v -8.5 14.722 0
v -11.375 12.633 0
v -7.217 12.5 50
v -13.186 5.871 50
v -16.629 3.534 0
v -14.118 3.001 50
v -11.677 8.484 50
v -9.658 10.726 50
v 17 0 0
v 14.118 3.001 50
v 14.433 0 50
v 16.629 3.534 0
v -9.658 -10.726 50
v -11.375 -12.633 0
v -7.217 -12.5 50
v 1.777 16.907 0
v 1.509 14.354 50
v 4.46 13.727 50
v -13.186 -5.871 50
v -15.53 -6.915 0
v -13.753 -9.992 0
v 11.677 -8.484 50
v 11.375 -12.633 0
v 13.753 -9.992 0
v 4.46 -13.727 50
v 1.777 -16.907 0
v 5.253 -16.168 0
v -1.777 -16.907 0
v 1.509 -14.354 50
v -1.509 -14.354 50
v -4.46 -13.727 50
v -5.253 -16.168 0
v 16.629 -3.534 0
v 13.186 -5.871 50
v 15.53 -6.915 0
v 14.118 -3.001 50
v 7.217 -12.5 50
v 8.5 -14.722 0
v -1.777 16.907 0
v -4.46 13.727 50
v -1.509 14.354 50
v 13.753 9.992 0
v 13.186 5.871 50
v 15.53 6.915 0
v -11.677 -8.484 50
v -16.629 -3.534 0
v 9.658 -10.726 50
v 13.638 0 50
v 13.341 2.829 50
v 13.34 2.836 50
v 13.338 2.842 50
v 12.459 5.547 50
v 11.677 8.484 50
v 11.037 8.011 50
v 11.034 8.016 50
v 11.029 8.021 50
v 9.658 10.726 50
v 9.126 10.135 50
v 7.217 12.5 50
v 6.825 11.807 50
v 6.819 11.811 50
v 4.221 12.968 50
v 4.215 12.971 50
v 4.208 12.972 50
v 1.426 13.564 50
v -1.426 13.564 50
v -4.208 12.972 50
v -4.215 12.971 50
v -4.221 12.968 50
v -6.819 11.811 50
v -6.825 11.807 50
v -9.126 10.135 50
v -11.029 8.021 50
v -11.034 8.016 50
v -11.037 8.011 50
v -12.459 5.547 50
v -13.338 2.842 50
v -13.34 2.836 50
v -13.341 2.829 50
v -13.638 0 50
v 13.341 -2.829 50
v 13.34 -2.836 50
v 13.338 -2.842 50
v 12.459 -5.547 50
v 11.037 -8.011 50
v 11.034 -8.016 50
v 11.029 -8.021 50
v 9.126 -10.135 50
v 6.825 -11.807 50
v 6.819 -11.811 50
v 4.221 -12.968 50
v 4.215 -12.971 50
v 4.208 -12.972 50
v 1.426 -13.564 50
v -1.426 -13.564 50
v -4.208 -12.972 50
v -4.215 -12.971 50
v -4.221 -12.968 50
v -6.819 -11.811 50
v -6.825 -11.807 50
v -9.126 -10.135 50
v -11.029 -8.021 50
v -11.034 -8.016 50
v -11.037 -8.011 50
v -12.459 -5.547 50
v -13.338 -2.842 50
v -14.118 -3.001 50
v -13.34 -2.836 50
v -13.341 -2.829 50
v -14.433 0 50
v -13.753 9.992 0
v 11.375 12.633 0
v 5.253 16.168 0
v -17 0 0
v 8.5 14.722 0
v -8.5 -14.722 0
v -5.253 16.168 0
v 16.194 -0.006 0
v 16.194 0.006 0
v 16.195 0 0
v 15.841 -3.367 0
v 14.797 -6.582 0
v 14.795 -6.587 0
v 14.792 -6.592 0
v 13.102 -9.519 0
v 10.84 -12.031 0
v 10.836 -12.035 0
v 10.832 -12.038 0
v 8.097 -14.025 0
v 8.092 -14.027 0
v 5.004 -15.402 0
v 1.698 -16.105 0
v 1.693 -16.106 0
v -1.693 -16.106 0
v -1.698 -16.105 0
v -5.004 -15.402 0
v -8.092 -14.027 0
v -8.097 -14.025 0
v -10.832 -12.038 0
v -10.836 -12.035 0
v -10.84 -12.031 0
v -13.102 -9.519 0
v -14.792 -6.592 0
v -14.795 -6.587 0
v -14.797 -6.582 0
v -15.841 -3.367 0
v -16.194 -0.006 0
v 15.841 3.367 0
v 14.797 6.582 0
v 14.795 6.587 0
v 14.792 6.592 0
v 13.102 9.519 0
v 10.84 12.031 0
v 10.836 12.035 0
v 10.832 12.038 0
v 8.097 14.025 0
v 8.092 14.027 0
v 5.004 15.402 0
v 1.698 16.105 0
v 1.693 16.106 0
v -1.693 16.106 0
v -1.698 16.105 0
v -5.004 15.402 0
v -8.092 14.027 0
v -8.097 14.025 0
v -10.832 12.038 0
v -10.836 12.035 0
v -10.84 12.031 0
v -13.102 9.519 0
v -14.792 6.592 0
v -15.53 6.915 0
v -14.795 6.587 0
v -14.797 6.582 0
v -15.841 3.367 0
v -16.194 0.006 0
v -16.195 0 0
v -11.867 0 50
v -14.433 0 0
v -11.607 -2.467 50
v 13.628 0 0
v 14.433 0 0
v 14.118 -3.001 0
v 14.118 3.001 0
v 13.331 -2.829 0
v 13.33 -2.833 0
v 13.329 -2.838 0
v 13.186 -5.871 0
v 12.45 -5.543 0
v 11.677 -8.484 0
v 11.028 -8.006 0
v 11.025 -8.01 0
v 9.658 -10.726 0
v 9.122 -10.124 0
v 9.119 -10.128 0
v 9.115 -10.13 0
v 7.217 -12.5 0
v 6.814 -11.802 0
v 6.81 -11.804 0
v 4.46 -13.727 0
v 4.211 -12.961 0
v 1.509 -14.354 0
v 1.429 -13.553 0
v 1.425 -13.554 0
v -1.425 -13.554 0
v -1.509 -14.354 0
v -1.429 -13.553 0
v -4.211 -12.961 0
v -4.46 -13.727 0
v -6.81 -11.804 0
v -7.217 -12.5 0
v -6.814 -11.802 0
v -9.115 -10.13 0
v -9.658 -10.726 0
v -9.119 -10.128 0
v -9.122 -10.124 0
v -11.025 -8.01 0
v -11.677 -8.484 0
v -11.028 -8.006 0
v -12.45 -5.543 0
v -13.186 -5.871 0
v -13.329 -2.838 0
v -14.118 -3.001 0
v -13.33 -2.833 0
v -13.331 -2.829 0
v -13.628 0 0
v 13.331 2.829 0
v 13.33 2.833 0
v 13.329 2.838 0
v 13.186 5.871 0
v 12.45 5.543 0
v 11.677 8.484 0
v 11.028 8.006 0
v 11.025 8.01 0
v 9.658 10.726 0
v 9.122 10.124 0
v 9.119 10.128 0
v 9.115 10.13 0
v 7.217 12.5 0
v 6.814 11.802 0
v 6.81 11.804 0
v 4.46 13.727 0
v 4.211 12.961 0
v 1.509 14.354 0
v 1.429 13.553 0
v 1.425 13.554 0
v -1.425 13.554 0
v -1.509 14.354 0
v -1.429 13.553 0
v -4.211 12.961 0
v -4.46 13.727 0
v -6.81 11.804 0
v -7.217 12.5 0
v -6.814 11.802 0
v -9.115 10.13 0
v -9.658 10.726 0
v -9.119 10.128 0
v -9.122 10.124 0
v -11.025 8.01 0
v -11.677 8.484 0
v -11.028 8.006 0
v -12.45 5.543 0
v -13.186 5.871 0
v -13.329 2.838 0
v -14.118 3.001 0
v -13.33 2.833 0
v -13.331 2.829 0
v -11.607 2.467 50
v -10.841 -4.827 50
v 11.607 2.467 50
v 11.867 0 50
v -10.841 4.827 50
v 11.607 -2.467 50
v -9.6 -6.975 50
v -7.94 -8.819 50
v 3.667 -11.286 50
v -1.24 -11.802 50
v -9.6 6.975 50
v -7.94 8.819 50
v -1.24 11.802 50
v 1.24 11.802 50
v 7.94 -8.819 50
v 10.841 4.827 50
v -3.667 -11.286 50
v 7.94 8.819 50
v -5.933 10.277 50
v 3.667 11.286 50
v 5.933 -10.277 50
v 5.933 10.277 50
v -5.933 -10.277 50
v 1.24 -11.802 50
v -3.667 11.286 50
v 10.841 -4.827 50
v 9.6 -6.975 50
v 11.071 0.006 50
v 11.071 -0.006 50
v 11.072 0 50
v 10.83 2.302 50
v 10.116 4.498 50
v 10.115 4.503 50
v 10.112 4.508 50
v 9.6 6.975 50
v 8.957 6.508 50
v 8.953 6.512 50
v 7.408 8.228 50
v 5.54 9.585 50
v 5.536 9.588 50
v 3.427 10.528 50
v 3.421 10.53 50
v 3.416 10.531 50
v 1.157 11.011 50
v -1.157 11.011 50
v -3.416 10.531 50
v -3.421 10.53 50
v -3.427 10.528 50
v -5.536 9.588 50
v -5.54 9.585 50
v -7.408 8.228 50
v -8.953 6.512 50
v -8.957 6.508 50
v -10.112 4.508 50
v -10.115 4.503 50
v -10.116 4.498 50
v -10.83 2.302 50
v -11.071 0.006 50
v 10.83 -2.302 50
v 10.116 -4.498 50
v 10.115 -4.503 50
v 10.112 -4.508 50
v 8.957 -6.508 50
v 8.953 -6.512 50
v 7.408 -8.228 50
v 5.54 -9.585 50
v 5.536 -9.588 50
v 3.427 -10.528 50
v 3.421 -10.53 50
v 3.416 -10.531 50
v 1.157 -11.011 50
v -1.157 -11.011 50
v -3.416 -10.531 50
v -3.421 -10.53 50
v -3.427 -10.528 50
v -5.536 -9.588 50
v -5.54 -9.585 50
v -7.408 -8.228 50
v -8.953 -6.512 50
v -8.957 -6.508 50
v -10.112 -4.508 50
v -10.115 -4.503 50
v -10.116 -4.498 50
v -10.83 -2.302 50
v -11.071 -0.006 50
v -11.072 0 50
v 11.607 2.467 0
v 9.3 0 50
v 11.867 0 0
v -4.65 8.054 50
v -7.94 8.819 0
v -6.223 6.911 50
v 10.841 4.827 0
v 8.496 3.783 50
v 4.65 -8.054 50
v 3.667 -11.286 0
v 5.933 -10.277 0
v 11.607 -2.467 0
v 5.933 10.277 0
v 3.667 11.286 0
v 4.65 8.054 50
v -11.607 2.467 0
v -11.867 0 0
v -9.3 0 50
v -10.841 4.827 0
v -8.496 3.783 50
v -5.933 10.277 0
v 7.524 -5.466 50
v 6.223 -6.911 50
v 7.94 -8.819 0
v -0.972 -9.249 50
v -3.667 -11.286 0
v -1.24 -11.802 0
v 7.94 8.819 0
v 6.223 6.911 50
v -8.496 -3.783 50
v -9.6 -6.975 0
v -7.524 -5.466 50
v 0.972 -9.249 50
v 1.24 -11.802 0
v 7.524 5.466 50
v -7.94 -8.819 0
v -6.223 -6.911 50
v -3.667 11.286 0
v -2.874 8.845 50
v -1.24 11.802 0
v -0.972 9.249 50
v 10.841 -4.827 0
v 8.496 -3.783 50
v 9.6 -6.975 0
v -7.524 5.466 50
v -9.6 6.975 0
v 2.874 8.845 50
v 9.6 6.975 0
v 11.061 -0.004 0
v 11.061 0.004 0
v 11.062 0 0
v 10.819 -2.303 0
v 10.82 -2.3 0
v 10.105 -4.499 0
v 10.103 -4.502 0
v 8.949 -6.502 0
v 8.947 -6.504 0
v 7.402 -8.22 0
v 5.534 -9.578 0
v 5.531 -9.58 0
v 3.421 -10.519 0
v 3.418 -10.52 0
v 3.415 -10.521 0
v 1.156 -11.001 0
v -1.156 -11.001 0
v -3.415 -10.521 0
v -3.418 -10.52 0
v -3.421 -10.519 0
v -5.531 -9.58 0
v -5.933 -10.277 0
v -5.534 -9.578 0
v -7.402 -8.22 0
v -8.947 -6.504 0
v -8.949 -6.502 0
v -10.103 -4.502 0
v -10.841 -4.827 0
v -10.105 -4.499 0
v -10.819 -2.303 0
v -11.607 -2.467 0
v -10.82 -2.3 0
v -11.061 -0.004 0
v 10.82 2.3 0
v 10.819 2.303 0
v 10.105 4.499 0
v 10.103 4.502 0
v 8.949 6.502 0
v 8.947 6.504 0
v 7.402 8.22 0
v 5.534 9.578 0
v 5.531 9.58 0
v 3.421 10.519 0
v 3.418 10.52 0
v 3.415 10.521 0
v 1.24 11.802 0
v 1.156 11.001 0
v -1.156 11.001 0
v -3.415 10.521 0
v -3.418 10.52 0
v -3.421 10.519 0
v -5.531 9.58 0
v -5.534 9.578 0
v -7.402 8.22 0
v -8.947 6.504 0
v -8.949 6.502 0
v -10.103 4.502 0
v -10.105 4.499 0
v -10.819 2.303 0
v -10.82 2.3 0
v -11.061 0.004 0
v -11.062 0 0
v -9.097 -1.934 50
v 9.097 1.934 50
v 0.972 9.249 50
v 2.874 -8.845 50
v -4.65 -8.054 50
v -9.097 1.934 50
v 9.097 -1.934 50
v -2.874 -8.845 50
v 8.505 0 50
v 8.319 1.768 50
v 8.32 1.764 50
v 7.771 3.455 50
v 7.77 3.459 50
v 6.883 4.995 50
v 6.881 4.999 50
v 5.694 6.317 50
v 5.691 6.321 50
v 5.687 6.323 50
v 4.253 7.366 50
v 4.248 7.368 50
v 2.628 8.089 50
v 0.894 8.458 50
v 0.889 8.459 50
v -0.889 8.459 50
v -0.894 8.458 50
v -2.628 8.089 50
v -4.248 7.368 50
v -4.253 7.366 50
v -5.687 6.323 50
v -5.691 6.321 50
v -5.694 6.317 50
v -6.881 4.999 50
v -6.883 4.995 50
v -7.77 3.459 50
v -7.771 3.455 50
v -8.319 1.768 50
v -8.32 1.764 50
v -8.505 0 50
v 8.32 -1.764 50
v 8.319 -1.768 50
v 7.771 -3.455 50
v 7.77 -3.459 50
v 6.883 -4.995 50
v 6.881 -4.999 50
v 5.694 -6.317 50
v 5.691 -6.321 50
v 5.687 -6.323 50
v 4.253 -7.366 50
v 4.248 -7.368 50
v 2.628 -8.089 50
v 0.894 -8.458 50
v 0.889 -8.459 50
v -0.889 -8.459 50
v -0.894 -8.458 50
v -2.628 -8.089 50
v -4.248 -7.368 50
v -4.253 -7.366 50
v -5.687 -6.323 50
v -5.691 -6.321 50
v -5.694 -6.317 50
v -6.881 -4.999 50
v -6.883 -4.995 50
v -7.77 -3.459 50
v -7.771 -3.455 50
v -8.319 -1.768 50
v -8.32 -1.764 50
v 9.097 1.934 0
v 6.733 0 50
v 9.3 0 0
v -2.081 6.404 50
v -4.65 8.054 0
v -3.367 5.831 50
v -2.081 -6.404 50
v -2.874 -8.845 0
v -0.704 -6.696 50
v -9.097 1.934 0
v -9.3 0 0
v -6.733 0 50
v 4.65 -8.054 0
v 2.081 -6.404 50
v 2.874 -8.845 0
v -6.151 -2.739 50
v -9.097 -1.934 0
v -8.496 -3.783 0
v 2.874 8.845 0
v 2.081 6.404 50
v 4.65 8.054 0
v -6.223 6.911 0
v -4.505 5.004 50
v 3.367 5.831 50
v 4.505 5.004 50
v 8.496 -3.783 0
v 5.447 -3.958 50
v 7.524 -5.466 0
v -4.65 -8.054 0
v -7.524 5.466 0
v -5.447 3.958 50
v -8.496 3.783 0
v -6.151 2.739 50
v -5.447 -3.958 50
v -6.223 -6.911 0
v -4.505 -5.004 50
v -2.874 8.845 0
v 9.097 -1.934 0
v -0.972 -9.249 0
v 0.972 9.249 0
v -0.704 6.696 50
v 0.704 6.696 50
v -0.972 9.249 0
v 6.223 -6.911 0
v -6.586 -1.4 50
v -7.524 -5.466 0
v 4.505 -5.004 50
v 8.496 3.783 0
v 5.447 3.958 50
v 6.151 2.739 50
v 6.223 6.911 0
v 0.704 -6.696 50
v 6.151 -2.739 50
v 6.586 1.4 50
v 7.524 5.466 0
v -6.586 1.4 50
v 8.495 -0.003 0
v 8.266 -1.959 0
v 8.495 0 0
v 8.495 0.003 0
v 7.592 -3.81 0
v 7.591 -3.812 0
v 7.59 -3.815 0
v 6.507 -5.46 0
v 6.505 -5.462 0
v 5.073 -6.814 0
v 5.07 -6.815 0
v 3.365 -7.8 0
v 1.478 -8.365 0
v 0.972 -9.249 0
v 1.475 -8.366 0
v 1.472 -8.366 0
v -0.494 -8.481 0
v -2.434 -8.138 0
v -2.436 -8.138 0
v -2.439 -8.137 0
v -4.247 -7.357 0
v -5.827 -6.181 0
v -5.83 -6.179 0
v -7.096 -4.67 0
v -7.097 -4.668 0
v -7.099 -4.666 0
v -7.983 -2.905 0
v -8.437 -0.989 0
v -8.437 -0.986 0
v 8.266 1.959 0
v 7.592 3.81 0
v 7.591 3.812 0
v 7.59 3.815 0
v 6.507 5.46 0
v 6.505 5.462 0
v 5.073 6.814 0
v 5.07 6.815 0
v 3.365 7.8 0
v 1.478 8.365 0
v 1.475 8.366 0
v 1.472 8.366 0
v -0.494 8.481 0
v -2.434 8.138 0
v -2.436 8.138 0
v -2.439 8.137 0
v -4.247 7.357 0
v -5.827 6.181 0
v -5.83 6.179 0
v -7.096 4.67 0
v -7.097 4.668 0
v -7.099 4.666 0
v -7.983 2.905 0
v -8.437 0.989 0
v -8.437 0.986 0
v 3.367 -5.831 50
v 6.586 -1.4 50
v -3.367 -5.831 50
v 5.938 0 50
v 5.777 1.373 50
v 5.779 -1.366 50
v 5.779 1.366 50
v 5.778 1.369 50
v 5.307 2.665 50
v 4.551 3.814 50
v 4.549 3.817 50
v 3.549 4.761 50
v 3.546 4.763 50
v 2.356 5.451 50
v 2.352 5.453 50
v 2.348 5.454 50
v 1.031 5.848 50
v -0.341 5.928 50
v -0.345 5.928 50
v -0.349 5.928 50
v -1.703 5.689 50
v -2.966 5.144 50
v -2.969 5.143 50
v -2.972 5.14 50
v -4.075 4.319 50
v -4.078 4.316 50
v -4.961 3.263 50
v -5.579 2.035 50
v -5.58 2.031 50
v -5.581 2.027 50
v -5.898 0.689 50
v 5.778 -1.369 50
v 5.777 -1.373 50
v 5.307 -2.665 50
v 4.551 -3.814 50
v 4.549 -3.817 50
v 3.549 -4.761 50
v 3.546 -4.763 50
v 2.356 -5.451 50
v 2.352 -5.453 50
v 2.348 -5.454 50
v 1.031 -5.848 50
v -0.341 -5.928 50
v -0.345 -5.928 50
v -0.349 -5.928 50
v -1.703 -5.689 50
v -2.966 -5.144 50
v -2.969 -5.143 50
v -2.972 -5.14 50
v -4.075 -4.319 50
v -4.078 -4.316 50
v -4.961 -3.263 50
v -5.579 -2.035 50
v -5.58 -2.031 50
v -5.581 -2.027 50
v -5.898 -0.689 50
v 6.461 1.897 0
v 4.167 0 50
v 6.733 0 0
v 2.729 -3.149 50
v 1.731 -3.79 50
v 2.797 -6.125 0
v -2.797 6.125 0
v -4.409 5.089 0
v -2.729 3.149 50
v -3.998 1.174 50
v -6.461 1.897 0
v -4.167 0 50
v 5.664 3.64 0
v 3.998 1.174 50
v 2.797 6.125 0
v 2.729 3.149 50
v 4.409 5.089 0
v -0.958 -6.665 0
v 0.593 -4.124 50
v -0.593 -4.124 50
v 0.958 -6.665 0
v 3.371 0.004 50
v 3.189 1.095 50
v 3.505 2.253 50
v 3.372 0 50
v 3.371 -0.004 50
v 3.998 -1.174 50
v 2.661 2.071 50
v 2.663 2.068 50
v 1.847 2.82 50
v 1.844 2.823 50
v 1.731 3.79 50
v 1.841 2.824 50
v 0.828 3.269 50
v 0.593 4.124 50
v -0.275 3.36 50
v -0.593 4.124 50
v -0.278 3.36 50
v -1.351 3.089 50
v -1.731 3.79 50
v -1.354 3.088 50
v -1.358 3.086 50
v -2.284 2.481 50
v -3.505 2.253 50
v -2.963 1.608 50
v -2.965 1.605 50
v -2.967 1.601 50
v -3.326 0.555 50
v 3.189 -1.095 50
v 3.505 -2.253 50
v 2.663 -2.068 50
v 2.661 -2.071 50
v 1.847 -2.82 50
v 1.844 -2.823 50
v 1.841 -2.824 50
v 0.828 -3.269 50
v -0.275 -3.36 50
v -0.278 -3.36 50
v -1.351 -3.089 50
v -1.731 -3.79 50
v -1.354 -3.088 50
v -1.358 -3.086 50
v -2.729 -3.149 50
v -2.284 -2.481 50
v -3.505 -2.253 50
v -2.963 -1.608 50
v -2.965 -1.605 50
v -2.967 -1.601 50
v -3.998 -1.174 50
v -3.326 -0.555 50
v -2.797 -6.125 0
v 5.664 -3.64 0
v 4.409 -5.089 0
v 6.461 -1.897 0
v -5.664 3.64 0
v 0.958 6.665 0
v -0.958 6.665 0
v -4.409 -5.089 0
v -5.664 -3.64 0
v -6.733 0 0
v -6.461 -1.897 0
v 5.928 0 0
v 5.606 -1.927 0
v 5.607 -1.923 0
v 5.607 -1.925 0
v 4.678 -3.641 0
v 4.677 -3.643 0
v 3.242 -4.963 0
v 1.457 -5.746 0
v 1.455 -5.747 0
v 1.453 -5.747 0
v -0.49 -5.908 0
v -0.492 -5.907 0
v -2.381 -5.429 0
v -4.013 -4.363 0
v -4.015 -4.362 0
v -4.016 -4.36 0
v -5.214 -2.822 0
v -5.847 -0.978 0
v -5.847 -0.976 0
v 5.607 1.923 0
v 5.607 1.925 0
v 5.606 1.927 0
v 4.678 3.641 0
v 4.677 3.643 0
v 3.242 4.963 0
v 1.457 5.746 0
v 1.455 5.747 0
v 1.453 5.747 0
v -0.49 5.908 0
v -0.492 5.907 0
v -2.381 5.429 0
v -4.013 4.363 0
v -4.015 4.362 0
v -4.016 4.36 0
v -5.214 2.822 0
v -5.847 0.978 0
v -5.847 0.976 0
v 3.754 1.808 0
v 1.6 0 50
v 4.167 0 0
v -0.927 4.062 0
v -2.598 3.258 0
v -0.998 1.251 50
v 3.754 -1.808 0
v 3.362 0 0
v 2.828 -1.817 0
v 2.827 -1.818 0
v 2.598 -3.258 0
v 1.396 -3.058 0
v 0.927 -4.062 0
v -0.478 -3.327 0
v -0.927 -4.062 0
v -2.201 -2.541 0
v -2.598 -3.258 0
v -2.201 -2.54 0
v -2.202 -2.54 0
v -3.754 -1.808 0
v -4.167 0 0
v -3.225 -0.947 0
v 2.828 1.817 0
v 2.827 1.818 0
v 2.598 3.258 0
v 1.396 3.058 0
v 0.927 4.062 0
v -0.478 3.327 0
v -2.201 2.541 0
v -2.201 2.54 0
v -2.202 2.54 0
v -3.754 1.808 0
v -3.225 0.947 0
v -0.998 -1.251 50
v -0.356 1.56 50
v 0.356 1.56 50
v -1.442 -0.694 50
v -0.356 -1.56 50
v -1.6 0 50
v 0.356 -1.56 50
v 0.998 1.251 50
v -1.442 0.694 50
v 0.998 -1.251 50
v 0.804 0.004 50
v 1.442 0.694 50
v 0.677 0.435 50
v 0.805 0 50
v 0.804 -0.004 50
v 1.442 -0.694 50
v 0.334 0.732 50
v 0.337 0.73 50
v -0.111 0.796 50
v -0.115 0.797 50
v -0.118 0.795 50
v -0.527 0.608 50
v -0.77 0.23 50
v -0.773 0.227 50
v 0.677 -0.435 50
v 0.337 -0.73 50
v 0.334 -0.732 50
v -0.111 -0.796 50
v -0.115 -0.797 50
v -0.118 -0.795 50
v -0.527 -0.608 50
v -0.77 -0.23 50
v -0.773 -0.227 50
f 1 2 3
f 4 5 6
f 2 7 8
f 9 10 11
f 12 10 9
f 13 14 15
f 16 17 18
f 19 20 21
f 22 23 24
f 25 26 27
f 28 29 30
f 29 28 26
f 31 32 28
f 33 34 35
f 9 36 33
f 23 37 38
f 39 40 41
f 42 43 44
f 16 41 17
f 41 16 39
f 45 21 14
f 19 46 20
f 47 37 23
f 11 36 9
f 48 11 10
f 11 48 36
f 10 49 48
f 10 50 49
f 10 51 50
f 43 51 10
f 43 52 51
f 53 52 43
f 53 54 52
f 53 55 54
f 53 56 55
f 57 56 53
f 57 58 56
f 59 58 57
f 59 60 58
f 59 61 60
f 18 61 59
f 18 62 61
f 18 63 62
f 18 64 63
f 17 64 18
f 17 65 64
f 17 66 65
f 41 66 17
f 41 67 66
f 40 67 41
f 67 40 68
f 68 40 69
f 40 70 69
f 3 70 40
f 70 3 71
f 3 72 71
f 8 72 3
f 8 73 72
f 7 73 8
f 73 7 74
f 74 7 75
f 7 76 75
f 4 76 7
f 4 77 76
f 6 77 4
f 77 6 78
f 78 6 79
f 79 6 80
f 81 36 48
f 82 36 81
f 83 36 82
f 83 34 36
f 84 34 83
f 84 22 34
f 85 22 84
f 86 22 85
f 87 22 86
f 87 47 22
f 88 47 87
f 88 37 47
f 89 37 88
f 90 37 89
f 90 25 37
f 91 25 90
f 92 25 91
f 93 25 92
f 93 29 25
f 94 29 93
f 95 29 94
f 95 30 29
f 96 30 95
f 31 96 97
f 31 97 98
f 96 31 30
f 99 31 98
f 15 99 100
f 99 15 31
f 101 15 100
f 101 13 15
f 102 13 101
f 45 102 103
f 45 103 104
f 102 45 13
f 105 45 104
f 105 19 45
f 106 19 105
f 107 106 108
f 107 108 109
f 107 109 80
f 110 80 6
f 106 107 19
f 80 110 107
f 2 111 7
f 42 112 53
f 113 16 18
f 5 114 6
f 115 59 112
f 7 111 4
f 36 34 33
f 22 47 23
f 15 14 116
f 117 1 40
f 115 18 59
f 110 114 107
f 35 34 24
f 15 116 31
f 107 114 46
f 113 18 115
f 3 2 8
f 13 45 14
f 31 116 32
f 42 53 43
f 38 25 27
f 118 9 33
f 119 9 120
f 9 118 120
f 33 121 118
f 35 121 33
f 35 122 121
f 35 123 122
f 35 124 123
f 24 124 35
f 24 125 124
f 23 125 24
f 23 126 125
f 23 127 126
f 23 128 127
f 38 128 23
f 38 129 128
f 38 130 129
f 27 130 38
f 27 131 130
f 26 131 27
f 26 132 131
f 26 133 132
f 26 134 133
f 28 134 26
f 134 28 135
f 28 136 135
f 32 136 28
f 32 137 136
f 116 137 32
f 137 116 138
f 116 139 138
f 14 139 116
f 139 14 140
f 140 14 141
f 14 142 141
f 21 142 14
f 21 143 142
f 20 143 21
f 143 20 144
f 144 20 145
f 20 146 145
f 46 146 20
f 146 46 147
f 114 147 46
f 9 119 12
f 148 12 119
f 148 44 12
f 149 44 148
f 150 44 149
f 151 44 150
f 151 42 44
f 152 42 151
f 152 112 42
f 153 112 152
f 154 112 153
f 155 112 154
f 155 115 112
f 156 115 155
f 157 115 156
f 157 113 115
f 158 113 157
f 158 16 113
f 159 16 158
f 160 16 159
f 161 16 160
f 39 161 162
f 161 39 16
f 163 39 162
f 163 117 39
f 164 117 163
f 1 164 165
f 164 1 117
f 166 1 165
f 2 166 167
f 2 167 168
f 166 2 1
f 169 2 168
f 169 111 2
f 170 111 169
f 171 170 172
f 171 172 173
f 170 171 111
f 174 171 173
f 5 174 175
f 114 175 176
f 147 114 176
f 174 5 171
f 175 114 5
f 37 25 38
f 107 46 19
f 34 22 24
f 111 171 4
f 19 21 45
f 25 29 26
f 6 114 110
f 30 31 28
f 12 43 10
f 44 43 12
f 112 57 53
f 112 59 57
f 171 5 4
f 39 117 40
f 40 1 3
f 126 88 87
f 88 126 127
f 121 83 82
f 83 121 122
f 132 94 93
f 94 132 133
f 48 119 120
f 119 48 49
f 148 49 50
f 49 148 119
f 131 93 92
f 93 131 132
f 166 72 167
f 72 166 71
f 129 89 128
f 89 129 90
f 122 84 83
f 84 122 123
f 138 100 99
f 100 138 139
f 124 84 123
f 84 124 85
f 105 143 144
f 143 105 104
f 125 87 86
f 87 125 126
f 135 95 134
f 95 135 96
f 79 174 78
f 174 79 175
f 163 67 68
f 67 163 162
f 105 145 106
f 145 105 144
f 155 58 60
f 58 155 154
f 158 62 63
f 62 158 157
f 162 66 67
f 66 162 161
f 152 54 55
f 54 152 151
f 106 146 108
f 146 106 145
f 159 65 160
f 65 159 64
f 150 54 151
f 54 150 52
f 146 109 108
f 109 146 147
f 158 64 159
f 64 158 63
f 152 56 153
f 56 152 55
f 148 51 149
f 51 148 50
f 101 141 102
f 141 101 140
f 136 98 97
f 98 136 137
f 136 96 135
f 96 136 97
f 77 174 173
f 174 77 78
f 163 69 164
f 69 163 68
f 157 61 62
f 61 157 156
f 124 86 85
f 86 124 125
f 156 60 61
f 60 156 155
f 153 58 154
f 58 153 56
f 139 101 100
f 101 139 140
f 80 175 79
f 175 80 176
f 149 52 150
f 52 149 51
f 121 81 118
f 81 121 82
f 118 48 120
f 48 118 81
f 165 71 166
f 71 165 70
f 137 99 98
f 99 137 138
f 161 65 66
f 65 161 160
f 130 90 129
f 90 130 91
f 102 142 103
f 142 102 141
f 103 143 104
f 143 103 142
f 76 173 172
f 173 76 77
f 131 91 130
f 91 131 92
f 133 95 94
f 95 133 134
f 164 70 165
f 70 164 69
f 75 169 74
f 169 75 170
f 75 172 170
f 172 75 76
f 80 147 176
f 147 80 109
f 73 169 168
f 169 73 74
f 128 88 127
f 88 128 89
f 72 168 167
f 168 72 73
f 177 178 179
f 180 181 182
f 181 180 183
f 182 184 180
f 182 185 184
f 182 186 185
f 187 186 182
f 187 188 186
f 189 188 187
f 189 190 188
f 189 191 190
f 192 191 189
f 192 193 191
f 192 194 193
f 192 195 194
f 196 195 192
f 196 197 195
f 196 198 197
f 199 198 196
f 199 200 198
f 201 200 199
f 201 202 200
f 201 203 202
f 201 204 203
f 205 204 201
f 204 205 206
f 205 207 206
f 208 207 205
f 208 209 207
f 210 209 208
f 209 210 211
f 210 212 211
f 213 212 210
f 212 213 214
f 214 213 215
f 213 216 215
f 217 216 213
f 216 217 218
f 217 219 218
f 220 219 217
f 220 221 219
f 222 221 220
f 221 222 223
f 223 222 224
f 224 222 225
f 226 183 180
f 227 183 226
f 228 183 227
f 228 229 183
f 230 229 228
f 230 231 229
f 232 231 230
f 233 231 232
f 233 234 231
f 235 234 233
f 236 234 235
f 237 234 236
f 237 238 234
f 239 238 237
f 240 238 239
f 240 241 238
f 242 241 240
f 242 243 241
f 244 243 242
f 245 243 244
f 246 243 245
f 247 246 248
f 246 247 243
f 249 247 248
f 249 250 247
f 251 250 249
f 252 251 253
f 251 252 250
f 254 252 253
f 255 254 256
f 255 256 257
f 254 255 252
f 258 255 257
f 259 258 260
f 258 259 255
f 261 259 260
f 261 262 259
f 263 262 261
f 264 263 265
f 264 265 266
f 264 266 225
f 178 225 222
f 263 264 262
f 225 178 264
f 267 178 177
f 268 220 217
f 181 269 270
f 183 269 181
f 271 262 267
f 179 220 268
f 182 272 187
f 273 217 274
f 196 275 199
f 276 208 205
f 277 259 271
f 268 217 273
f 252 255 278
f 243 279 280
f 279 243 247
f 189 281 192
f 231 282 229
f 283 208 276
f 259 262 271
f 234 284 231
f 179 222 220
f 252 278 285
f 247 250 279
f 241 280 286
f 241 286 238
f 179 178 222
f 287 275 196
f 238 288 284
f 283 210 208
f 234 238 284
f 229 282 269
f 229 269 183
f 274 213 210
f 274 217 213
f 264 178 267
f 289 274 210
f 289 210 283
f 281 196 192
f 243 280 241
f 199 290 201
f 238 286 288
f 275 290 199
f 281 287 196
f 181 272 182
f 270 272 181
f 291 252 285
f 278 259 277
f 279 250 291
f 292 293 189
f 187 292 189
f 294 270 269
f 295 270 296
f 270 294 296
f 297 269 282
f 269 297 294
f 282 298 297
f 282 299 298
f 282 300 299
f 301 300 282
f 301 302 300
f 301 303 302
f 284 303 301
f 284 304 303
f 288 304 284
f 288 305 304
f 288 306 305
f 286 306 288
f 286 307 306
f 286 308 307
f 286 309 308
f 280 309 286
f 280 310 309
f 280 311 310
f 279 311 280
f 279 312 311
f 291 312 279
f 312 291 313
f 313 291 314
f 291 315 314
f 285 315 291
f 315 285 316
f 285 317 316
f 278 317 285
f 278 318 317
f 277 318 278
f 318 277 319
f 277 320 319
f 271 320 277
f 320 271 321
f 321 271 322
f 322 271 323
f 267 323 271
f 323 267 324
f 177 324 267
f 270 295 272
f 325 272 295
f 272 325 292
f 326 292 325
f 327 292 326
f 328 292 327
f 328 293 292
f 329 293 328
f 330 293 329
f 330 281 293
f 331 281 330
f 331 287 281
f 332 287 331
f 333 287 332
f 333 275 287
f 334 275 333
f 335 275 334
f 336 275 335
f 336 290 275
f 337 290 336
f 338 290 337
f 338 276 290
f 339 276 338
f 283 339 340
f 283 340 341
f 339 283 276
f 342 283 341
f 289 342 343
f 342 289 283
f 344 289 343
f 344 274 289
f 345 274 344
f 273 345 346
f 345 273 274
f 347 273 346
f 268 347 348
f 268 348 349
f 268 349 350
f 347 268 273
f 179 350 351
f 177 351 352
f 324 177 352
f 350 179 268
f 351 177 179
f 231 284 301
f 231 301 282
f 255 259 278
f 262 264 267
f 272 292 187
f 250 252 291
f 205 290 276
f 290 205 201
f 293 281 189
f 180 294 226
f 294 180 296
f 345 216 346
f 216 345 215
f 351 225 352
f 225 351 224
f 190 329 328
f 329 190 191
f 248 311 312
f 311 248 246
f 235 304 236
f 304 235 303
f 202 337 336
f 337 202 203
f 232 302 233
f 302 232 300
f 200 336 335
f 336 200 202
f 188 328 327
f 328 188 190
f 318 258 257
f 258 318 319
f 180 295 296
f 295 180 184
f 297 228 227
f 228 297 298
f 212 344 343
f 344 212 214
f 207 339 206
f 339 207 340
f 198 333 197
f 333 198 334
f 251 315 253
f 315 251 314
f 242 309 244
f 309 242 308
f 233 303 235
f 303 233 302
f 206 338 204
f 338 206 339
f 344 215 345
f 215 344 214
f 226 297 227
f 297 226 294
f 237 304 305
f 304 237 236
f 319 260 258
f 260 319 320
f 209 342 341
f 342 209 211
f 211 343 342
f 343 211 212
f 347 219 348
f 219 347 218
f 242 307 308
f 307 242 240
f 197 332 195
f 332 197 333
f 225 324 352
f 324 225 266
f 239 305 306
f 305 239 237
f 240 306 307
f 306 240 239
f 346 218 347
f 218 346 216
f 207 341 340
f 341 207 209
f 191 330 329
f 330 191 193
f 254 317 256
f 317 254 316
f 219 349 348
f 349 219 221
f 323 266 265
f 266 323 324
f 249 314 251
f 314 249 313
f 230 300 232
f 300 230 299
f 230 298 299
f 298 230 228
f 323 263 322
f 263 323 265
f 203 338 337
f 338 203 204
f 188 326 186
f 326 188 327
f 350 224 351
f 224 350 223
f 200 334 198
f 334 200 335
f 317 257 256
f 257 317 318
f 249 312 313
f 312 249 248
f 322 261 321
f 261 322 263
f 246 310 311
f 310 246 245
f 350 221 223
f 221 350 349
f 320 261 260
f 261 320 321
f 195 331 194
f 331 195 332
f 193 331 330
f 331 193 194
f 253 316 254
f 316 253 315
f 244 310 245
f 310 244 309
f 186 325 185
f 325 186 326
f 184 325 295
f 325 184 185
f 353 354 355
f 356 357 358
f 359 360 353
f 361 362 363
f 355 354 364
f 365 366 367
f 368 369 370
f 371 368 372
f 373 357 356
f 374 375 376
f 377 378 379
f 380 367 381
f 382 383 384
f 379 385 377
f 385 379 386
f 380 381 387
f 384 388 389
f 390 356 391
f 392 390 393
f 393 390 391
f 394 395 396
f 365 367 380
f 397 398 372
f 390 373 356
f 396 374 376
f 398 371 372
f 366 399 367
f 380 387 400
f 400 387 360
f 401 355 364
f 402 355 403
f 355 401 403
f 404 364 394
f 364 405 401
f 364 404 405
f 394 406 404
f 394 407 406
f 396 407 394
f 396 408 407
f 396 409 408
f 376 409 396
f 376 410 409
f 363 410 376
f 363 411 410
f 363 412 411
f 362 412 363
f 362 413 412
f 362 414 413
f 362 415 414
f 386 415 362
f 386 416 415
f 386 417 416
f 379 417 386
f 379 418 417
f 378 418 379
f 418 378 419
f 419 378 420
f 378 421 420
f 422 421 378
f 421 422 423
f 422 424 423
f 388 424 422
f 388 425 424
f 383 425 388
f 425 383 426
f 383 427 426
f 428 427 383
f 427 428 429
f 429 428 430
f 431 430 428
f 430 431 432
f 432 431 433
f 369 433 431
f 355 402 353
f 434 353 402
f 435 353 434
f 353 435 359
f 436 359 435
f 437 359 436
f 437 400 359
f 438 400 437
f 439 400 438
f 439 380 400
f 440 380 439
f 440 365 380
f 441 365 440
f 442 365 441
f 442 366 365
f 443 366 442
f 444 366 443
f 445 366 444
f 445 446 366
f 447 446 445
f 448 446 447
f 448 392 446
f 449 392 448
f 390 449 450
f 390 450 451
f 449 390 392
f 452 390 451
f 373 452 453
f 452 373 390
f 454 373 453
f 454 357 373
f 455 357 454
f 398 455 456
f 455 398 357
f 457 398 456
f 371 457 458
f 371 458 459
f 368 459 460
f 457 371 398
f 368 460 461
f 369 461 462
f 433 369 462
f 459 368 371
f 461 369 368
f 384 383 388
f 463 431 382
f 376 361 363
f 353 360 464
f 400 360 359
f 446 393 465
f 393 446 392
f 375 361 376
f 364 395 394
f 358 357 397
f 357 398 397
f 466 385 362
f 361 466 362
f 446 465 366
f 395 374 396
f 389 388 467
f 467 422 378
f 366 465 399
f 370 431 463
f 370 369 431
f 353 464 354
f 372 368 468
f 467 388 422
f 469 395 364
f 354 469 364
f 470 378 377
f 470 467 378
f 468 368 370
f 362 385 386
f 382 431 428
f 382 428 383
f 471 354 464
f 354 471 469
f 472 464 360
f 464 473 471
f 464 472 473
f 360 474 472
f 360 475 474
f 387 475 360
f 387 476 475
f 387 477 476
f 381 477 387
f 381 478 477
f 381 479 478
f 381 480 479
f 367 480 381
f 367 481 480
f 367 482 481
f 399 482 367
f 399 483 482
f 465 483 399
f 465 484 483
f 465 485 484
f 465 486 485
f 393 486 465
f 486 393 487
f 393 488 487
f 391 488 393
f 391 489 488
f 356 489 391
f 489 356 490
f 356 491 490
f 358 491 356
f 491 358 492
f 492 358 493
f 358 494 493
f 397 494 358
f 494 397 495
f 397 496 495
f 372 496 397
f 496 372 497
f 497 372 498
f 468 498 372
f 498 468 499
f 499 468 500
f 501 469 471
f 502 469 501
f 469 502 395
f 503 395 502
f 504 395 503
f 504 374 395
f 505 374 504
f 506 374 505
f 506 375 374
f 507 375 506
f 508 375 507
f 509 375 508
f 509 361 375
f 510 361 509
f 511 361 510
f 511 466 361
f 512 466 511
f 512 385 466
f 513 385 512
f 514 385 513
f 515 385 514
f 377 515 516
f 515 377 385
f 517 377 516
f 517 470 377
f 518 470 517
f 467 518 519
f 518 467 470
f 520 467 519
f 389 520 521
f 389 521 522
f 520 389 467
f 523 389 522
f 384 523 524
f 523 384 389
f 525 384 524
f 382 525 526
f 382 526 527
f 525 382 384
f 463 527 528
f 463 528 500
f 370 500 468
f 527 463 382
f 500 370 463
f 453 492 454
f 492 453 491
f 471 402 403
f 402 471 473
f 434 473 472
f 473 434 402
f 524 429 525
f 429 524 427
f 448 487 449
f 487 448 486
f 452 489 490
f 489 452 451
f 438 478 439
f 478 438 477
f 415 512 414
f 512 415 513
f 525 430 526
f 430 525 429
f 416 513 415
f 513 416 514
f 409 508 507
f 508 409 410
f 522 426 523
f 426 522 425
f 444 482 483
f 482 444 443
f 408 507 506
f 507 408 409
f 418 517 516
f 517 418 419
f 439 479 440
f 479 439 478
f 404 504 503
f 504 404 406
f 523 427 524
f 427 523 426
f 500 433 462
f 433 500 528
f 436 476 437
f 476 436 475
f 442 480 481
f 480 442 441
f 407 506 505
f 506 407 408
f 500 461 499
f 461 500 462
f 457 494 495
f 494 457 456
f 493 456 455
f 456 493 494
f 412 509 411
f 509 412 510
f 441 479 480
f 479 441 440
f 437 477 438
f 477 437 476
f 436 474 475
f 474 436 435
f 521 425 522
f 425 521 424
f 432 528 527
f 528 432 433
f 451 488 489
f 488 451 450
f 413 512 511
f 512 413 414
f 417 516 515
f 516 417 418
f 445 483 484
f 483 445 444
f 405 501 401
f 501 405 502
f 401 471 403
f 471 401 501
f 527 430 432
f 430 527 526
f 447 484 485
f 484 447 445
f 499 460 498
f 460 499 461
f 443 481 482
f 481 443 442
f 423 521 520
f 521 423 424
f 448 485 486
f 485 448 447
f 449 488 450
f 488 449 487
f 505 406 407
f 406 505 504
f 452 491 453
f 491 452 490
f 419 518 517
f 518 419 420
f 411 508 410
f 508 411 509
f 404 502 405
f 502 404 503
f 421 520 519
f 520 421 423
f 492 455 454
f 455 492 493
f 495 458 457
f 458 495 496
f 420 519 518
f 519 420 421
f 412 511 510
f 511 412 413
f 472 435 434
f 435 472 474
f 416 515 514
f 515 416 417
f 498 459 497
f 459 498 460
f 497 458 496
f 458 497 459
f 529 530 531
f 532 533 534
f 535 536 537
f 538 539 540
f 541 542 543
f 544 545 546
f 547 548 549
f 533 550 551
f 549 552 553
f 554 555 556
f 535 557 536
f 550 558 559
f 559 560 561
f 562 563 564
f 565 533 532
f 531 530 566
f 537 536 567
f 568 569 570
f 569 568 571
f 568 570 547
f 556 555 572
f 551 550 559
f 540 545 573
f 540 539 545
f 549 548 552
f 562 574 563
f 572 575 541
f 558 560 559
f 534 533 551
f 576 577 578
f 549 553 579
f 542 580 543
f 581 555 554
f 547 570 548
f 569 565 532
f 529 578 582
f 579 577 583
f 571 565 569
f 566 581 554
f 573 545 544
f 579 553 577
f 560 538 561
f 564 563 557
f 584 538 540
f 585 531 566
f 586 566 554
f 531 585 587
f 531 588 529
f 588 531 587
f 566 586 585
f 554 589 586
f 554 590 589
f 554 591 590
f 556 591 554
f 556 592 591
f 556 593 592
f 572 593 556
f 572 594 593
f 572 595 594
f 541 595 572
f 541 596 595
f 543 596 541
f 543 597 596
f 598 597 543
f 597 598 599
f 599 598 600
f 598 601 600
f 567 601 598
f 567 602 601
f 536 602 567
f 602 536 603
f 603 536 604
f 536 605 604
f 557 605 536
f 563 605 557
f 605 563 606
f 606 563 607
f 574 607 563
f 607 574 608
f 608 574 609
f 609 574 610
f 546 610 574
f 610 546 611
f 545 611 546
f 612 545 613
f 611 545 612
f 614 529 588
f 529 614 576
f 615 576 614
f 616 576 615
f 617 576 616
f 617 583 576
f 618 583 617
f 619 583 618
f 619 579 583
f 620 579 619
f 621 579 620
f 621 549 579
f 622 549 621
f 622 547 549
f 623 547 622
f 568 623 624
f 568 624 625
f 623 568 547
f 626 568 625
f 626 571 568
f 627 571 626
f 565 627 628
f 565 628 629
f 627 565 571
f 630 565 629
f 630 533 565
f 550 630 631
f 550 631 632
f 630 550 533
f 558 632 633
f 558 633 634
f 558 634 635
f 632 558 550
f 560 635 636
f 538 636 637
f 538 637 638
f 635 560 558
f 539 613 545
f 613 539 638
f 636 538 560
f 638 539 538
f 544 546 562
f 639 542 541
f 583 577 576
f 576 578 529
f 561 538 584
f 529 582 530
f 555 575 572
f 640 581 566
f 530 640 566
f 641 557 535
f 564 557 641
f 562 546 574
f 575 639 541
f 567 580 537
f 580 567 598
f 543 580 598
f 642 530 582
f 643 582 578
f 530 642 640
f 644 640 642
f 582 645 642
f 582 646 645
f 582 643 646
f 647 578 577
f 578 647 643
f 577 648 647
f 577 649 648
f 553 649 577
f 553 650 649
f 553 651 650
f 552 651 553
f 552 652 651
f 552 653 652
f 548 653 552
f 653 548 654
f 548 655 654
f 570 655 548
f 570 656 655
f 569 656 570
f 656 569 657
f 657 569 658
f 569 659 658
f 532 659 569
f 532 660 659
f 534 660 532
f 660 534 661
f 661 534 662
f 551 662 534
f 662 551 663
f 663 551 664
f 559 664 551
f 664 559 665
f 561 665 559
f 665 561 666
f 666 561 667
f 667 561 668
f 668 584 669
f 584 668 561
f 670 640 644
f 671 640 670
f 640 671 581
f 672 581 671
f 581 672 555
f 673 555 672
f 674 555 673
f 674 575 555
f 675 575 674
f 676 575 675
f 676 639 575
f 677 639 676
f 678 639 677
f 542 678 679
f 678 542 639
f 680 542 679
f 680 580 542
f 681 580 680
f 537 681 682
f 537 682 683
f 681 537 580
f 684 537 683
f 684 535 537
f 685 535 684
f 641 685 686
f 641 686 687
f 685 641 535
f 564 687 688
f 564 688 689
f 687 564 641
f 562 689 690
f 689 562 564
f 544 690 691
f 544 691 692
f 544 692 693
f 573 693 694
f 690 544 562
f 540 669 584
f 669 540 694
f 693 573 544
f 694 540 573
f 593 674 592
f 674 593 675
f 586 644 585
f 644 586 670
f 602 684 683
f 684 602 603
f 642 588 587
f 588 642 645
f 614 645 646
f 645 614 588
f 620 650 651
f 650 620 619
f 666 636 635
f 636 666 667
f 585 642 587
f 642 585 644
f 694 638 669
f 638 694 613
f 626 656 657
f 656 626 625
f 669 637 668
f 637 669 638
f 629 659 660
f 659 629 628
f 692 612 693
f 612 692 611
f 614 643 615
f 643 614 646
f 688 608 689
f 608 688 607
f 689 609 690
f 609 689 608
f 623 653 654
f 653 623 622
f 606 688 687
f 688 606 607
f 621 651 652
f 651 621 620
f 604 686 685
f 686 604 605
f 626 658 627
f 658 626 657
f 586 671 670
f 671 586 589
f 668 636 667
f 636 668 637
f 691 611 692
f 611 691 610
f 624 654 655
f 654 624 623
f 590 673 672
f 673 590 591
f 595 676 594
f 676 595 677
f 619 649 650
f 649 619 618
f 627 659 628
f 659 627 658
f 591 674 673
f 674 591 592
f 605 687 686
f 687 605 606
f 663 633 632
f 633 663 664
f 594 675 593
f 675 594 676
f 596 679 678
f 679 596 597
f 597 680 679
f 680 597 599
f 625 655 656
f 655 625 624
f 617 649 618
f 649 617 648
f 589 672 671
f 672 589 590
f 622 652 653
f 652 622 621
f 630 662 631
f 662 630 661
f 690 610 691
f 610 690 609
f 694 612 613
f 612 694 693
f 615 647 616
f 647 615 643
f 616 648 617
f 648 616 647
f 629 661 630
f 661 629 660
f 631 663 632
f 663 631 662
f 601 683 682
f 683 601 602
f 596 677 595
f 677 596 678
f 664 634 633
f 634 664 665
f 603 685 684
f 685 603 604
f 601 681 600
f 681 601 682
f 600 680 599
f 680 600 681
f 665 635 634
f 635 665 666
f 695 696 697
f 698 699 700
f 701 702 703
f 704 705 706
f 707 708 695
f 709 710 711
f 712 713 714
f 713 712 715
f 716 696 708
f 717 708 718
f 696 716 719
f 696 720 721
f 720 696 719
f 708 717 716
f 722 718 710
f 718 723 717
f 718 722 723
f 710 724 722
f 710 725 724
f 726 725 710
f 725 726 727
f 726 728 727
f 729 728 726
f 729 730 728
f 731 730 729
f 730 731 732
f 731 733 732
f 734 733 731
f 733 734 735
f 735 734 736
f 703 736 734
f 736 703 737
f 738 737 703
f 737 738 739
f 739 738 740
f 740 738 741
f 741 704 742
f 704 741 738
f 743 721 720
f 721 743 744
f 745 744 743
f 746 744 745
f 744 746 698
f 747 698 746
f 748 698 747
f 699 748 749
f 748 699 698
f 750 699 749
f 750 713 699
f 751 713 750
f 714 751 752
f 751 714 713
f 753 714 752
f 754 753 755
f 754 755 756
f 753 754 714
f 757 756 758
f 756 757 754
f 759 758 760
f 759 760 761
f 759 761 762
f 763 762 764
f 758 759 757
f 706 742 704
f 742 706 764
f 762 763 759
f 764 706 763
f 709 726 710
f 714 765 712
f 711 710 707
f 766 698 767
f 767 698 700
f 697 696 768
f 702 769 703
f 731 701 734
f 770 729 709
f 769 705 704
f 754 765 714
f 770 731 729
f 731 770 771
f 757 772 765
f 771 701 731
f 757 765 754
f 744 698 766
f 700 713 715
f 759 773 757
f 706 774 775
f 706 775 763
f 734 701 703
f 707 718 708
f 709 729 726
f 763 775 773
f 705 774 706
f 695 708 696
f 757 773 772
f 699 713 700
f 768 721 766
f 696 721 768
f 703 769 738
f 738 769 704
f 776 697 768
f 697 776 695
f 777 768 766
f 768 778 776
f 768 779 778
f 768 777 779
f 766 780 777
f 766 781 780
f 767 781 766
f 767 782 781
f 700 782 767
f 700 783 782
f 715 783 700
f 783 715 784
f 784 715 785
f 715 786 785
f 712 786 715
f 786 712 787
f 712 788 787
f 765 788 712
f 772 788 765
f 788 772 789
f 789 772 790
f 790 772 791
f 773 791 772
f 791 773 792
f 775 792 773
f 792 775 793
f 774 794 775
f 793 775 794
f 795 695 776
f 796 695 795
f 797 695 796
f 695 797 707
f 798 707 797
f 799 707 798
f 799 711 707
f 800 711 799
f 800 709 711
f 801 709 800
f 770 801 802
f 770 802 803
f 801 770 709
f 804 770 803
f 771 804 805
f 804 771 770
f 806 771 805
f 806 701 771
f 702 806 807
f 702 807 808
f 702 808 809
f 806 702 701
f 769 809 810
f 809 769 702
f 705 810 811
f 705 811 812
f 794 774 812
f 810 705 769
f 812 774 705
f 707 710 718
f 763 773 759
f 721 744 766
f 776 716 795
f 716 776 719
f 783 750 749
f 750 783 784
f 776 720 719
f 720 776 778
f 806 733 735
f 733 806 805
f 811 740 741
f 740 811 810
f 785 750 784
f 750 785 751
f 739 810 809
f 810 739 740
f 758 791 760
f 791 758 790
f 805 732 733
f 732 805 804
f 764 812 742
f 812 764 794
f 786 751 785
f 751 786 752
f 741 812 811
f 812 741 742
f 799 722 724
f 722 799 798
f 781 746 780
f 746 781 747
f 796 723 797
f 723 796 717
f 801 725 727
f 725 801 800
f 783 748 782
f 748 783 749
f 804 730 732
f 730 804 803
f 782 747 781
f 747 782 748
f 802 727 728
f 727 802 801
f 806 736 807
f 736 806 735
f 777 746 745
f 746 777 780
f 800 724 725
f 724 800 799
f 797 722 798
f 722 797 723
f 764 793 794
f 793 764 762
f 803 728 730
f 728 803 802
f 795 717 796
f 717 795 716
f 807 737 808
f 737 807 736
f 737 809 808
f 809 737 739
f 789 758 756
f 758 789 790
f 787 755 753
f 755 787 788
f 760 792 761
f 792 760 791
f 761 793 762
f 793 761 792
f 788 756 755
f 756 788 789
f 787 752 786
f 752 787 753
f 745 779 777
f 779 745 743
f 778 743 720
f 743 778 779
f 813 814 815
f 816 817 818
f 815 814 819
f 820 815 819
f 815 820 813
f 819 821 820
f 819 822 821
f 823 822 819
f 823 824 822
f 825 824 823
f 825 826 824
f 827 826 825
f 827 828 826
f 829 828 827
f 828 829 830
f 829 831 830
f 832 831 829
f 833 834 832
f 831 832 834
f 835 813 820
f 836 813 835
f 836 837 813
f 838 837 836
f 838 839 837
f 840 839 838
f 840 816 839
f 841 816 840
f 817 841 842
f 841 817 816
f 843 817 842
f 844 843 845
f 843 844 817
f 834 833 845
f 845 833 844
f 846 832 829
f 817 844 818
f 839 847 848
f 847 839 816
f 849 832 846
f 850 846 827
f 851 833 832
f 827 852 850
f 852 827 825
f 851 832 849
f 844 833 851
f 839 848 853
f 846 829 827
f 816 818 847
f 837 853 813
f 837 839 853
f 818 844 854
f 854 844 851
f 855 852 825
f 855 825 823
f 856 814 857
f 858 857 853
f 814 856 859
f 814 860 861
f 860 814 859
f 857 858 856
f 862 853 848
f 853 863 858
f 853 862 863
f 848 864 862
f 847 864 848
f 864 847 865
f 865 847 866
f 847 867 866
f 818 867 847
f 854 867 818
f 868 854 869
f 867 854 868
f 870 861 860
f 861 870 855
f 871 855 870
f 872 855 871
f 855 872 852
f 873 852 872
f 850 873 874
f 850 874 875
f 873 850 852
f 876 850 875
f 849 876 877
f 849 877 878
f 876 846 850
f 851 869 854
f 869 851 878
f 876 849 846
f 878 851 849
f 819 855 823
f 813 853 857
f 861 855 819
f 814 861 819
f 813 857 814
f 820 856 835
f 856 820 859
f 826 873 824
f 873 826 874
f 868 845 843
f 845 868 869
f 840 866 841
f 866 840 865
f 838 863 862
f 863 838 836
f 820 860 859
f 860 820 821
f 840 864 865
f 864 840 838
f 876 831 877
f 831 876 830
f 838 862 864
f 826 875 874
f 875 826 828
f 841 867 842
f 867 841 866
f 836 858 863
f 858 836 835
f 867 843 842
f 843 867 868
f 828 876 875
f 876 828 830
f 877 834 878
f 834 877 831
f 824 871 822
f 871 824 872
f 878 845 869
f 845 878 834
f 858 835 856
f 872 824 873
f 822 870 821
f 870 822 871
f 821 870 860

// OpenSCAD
//shell thickness
ep		=0.8;  		
//seg height
hseg		= 50;		
//seg count
nseg		=6;			
//bottom radius
rb			= 17;		
//top radius
rt			= 1.6;			
//show ready to print (0) or extended (1)
deploie=0;
//hollow segment using csg (0) or create solid shape made hollow with cura (1)
nocsg=0;

rdelta = (rb - rt) /nseg;
pente = hseg / rdelta;
zz = ep * pente ;  //friction zone


echo(str("<h2>overlap:",zz,"mm<br>size when extended: " , nseg*hseg-(nseg-1)*zz , " mm</h2><br>"));

for (n=[0:nseg-1])
	{
		translate([0,0,deploie*n*(hseg-zz)]) 
		{
			difference()
				{
				cylinder(r1=rb-n*rdelta,r2=rb-(n+1)*rdelta,h=hseg);
				translate([500*nocsg,0,-0.1]) cylinder(r1=-ep+rb-n*rdelta,r2=-ep+rb-(n+1)*rdelta,h=hseg+0.2);
				}
		}
	}
